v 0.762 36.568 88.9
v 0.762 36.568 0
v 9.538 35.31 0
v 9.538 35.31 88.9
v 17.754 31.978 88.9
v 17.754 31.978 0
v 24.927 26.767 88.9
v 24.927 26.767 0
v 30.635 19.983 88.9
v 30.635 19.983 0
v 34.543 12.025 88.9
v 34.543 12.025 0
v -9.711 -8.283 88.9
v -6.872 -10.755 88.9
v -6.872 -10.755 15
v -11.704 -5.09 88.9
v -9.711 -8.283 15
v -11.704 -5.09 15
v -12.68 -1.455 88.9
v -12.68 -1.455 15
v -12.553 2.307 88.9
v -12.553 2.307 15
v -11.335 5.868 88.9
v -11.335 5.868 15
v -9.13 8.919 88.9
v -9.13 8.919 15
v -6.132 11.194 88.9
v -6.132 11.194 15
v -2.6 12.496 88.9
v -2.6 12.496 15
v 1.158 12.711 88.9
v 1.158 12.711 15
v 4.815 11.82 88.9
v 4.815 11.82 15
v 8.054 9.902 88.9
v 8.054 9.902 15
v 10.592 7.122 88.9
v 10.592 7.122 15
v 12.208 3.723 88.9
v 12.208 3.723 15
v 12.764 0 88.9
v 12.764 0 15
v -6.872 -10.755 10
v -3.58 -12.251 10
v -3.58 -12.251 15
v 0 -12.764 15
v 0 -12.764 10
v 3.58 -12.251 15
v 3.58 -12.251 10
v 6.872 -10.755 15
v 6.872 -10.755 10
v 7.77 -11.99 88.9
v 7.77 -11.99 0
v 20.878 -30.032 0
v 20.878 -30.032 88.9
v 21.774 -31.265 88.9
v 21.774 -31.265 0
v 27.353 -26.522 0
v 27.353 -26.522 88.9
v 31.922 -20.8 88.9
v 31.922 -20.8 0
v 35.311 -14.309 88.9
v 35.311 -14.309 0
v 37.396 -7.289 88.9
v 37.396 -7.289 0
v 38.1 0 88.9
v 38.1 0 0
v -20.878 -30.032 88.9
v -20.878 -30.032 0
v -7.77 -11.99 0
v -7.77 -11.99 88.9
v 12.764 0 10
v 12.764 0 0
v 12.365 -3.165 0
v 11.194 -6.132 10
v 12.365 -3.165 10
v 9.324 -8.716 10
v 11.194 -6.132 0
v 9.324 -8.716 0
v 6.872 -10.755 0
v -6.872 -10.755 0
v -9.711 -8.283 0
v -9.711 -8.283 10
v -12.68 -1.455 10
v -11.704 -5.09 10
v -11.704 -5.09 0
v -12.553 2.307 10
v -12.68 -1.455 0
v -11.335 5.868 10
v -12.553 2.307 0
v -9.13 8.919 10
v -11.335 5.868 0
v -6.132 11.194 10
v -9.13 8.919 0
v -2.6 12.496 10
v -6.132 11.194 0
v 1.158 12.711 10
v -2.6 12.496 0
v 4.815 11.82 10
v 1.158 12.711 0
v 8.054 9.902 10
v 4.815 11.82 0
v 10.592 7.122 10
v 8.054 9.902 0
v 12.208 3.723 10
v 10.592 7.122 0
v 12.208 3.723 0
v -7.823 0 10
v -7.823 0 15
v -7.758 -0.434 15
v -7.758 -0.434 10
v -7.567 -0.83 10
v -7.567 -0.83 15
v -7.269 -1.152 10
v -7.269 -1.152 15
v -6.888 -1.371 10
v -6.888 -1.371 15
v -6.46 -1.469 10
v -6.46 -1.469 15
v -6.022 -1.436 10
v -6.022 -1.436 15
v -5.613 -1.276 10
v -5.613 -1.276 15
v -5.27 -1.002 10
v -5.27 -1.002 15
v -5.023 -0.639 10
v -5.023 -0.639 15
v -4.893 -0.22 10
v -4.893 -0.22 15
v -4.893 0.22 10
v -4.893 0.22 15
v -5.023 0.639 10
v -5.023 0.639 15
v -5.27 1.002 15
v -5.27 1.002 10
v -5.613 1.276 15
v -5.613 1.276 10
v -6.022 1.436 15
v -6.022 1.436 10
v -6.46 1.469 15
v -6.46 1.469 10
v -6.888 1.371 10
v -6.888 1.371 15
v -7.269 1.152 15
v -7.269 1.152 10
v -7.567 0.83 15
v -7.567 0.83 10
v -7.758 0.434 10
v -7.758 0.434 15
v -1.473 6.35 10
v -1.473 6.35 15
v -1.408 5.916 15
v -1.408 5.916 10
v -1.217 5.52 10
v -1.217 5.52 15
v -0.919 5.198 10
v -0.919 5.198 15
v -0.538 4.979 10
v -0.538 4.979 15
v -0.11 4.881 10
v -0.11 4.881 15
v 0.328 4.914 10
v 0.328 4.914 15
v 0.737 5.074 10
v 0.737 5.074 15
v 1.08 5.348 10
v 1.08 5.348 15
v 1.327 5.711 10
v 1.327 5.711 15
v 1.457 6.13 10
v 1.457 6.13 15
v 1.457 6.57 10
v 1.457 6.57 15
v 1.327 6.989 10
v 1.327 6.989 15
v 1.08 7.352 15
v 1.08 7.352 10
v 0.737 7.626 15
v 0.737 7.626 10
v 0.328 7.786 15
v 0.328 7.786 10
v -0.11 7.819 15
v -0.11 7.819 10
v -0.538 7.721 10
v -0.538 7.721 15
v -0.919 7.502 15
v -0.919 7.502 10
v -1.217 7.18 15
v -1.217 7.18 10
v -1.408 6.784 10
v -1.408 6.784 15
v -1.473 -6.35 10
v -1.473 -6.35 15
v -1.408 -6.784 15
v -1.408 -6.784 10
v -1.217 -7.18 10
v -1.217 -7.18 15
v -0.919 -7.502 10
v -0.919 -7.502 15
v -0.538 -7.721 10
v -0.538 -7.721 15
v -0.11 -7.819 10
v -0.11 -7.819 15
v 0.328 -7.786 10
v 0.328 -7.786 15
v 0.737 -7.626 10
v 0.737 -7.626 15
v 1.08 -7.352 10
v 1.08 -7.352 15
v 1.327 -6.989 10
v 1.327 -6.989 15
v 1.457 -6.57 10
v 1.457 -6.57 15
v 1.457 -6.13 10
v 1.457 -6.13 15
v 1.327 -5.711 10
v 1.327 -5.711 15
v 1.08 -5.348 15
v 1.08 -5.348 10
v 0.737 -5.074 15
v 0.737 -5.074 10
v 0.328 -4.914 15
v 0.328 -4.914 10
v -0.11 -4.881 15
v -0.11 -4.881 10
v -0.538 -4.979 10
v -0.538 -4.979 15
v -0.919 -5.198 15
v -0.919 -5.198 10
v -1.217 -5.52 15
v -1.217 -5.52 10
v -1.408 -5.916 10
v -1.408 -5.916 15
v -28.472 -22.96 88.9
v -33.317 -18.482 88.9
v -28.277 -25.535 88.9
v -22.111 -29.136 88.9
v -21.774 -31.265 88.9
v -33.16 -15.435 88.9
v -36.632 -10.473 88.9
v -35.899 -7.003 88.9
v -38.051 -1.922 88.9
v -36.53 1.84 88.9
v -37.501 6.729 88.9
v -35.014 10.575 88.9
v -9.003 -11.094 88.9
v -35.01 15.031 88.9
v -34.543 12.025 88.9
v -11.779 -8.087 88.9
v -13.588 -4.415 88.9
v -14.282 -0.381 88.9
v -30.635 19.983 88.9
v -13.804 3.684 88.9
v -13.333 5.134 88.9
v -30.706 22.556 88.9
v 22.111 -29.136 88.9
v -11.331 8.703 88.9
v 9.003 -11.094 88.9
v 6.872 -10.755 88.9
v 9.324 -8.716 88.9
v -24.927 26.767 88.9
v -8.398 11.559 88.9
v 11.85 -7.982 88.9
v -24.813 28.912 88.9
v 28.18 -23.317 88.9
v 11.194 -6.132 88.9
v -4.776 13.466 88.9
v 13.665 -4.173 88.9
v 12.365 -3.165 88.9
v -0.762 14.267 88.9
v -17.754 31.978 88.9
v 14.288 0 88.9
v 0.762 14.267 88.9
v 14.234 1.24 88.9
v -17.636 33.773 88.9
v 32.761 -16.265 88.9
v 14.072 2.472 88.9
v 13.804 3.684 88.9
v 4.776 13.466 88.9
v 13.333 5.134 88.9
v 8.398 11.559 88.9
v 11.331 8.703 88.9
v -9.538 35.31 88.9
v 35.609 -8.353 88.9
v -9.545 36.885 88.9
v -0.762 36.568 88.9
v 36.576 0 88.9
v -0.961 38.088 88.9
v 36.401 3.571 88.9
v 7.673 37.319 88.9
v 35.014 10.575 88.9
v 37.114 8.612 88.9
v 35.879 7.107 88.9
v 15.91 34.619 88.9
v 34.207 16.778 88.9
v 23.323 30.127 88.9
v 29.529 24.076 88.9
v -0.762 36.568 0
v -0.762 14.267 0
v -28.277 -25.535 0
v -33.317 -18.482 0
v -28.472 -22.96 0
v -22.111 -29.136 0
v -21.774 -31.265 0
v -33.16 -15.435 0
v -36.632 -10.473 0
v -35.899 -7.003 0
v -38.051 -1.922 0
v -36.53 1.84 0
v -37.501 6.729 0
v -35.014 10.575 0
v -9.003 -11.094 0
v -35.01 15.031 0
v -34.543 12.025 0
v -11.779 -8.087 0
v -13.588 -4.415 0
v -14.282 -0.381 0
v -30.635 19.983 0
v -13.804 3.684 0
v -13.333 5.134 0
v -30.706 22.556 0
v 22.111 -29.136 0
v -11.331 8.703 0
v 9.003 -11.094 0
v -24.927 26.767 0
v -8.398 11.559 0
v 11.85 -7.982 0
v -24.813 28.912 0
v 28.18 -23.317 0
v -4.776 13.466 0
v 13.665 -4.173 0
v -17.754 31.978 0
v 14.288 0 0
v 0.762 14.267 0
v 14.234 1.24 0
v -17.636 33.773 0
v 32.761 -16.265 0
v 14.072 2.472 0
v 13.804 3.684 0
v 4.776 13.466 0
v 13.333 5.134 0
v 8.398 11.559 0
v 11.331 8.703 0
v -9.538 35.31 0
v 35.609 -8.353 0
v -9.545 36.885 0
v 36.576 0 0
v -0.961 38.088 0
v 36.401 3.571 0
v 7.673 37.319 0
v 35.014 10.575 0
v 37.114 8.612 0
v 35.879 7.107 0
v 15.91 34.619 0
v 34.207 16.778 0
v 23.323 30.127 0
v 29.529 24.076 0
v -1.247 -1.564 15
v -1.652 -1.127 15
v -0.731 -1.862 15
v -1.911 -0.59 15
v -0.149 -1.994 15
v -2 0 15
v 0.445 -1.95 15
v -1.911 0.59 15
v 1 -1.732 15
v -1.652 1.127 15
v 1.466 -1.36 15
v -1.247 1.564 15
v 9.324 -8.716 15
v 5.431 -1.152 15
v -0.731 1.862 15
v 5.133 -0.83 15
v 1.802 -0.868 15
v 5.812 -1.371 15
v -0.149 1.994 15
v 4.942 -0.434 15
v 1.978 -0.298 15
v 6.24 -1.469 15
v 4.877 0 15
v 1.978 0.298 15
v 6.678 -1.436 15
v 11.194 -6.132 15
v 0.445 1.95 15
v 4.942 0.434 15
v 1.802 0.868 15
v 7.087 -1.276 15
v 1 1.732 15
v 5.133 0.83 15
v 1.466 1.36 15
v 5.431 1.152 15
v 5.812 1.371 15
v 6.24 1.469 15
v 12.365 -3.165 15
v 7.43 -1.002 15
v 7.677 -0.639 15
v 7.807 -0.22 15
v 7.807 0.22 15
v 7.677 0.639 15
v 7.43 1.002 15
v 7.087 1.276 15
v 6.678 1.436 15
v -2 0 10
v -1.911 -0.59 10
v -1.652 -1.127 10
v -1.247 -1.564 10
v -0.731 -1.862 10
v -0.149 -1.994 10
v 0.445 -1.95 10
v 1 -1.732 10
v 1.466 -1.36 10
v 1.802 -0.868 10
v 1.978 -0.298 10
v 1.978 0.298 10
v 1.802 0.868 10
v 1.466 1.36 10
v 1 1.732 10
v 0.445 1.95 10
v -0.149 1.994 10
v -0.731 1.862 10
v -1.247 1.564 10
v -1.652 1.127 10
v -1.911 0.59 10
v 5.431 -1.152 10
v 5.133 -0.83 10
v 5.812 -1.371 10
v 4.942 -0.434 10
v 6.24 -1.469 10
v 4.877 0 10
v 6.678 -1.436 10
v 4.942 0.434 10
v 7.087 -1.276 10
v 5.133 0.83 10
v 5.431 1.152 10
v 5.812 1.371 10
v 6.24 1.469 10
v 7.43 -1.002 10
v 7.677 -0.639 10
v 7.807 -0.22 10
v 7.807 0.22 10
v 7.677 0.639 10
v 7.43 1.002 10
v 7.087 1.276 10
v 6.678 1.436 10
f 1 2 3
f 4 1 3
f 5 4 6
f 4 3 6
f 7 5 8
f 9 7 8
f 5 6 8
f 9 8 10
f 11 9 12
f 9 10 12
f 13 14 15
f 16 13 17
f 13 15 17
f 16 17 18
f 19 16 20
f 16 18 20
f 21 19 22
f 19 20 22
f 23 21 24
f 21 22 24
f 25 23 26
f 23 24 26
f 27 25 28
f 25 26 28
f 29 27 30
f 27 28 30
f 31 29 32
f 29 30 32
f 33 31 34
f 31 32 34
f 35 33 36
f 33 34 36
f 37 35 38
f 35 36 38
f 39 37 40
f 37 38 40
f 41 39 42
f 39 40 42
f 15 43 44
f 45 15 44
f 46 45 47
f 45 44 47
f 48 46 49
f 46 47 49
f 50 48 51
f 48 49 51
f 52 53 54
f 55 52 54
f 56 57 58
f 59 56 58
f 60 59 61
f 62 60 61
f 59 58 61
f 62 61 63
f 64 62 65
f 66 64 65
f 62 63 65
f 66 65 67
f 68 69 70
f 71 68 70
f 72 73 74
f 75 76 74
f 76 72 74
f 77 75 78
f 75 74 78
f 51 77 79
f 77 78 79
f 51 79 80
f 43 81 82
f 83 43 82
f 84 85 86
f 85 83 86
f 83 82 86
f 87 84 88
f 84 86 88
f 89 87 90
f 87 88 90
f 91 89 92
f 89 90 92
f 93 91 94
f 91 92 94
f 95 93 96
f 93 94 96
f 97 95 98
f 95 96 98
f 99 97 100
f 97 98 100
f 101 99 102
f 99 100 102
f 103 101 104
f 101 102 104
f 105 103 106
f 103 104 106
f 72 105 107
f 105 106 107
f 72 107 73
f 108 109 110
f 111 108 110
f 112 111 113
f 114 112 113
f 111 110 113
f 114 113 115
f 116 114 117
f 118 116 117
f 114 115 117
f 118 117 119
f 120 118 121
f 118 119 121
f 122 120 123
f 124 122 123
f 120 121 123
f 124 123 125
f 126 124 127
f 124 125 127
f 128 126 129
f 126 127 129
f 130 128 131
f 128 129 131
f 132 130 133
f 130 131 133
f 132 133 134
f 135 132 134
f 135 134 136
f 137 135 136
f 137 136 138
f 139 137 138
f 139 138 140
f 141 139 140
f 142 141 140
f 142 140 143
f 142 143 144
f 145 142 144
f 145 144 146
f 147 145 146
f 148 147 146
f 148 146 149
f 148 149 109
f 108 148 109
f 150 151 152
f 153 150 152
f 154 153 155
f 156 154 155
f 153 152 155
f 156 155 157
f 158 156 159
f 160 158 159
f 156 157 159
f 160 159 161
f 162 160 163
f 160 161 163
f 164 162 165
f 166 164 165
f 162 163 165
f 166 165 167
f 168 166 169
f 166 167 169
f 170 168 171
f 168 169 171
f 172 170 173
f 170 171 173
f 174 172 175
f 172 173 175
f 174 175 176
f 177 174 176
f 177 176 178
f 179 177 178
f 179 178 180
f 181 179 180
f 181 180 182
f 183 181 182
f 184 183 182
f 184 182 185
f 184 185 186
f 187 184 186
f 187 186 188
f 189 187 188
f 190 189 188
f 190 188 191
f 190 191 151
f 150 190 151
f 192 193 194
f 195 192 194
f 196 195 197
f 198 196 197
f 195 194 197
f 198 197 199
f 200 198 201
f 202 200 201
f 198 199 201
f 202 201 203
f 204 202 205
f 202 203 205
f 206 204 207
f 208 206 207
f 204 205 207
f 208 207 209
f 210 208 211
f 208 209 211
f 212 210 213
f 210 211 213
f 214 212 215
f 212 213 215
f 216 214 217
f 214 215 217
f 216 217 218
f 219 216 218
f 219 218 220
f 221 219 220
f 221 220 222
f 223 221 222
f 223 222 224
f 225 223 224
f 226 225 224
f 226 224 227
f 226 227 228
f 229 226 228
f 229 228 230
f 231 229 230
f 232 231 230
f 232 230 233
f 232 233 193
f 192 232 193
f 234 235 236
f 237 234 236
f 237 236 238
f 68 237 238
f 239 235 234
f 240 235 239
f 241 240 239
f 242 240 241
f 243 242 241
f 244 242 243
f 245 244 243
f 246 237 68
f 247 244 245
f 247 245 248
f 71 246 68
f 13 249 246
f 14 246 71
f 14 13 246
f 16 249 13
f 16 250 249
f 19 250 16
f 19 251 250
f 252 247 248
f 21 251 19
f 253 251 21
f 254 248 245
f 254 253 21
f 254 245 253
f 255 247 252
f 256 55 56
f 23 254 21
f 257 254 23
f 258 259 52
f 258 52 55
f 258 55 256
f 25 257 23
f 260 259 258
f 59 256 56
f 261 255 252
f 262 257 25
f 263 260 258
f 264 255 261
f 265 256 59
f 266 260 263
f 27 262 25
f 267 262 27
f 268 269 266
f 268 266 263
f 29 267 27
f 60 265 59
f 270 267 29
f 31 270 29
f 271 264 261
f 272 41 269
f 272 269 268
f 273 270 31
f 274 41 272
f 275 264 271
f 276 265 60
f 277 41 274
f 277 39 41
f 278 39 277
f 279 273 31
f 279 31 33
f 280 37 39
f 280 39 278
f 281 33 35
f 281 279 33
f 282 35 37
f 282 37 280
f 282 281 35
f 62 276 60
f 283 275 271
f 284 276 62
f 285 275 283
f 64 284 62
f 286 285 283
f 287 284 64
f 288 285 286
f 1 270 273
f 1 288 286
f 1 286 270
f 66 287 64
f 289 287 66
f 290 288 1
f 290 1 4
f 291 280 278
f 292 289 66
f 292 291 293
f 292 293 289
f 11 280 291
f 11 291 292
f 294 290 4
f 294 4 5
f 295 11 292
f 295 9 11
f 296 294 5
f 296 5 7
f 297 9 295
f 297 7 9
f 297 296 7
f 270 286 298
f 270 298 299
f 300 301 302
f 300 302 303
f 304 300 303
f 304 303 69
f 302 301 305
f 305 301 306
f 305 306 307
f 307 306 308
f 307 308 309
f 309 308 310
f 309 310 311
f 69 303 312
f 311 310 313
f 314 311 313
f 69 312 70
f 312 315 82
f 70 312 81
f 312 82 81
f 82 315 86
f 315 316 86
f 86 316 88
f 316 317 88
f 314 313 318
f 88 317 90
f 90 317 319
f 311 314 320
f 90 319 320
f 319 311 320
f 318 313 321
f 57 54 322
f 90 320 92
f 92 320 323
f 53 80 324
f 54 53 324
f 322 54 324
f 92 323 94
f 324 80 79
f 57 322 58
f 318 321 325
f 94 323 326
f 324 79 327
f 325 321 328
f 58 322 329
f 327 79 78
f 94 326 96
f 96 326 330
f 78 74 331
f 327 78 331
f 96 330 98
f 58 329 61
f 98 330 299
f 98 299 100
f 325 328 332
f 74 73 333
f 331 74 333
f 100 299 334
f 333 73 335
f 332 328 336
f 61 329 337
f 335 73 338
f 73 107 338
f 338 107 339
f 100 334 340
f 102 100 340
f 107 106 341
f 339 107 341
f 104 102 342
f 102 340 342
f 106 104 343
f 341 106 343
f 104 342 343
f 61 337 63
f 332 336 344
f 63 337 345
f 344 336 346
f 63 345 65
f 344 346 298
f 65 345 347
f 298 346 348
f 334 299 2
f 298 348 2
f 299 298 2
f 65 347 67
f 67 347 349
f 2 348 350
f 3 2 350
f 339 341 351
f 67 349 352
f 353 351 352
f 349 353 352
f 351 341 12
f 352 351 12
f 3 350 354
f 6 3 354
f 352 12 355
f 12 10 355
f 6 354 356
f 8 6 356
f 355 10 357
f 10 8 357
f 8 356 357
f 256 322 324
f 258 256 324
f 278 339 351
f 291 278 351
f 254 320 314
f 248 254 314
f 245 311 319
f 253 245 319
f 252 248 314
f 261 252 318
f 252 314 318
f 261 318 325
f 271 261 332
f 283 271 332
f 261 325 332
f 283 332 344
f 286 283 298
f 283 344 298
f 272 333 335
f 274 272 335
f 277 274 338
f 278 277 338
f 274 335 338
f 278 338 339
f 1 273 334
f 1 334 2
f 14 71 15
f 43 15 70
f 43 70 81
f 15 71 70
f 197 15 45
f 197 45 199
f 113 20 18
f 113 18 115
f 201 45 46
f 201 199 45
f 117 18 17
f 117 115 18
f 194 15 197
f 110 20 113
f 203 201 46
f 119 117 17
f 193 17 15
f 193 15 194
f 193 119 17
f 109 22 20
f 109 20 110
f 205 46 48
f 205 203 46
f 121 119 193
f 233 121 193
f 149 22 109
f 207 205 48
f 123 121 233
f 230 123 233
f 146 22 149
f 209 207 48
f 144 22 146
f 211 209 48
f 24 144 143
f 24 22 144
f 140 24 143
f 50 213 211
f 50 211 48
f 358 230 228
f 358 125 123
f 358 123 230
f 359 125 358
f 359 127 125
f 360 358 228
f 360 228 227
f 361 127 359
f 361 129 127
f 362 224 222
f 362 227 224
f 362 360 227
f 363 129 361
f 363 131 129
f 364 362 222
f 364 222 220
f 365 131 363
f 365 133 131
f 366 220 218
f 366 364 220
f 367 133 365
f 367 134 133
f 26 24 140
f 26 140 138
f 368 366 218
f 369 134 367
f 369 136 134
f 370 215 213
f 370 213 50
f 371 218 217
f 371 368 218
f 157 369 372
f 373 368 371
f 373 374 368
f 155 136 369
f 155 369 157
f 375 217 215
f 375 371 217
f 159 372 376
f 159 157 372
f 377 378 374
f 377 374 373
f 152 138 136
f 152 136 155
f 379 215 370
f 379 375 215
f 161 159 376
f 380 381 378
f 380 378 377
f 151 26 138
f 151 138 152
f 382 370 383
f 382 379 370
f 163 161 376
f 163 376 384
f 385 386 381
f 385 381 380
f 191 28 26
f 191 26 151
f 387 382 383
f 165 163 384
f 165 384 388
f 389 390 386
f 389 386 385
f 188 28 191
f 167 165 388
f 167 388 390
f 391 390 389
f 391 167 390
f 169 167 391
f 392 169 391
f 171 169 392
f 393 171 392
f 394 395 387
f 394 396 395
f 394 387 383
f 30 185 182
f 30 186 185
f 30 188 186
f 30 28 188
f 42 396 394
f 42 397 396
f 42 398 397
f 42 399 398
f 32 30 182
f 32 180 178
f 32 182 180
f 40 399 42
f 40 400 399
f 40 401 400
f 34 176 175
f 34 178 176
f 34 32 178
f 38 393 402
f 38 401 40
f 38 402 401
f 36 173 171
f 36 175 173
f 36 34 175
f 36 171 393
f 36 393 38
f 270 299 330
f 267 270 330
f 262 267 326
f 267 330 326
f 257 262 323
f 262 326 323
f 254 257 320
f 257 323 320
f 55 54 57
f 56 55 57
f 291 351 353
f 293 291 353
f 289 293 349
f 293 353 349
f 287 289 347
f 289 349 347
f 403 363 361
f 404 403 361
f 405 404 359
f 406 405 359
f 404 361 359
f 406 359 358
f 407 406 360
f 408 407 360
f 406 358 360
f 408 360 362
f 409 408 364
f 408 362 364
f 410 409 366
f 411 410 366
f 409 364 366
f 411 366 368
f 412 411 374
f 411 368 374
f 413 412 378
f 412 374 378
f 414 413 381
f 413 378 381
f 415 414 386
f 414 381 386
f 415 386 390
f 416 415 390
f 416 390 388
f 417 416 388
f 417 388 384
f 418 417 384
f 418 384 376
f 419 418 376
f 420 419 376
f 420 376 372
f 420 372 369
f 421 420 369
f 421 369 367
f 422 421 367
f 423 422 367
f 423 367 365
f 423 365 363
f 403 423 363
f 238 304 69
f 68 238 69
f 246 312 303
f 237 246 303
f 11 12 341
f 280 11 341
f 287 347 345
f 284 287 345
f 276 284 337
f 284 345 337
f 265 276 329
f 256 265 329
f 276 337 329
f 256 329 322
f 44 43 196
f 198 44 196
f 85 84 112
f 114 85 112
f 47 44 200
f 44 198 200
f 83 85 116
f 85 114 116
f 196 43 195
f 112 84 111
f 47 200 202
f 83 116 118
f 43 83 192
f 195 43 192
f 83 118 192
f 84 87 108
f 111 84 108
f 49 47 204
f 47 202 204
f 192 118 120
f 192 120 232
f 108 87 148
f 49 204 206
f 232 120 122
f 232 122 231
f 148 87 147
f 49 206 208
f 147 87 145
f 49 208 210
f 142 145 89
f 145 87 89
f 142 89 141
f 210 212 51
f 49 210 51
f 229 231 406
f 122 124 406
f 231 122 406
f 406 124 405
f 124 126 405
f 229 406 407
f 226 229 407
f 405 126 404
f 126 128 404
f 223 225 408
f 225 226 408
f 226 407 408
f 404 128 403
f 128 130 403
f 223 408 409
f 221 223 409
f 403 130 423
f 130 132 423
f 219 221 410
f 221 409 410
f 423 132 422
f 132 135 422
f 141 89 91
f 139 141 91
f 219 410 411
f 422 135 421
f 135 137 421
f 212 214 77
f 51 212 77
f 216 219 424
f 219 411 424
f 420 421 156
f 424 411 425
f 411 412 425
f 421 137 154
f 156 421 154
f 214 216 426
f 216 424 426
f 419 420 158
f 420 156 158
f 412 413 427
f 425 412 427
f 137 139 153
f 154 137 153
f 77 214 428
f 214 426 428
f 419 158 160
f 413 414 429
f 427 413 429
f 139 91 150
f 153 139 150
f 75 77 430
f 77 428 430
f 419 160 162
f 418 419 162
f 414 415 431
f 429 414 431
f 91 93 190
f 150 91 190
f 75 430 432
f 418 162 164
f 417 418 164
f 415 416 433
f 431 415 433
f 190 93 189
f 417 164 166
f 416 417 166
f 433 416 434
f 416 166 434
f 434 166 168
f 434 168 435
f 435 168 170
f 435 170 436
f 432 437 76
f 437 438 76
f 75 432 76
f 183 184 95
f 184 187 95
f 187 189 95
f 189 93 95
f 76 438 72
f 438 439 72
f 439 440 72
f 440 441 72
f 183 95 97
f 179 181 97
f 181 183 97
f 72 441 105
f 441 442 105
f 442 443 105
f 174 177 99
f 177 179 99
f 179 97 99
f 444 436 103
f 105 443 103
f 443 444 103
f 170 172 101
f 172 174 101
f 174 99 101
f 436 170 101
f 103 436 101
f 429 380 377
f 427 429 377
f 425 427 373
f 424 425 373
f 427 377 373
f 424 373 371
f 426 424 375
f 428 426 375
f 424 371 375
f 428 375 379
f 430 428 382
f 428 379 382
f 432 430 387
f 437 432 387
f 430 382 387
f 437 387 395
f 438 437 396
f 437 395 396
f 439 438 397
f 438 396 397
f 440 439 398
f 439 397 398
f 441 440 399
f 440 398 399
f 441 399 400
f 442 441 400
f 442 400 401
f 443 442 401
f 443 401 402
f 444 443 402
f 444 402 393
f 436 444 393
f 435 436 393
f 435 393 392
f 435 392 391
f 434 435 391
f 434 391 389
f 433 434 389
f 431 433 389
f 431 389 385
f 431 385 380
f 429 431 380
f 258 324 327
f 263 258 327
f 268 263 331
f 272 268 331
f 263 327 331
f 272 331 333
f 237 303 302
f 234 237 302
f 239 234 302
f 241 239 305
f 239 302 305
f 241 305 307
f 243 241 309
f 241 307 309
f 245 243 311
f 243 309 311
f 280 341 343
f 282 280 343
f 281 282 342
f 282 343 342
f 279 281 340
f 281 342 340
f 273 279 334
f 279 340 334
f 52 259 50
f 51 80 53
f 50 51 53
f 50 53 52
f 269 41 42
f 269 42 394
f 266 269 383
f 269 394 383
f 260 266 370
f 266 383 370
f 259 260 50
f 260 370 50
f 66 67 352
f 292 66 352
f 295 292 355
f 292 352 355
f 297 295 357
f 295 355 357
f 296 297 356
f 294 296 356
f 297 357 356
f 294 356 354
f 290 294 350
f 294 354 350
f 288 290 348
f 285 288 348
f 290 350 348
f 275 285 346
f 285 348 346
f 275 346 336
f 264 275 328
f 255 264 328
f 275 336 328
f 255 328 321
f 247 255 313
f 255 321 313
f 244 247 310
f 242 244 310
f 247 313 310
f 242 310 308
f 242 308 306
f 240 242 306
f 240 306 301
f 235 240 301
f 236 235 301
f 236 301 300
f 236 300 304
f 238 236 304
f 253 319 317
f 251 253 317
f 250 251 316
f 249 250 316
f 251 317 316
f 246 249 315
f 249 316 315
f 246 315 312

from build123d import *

# Parameters (mm, degrees)
F1_DEPTH = 88.9
F3_R     = 12.7635
F4_DEPTH = 5
F5_D     = 2.9464
F6_D     = 4


with BuildPart() as f1:
    # F0 (on Top) → F1 (new body)
    with BuildSketch(Plane.XY):
        with BuildLine():
            ThreePointArc((-8.3979817921, -11.5588303071), (-8.0866479786, -11.7787427479), (-7.7695585406, -11.9902717373))
            Line((-7.7695585406, -11.9902717373), (-6.8723442619, -10.7553622252))
            ThreePointArc((-6.8723442619, -10.7553622252), (-6.1315481839, 11.194241784), (12.7635, 0))
            ThreePointArc((12.7635, 0), (11.194241784, -6.1315481839), (6.8723442619, -10.7553622252))
            Line((6.8723442619, -10.7553622252), (7.7695585406, -11.9902717373))
            ThreePointArc((7.7695585406, -11.9902717373), (8.0866479786, -11.7787427479), (8.3979817921, -11.5588303071))
            ThreePointArc((8.3979817921, -11.5588303071), (8.7033383912, -11.3306909365), (9.00250044, -11.0944870128))
            ThreePointArc((9.00250044, -11.0944870128), (12.8987573294, -6.1444866023), (14.2875, 0))
            ThreePointArc((14.2875, 0), (14.1661979921, 1.8578188013), (13.8043516957, 3.6840915448))
            ThreePointArc((13.8043516957, 3.6840915448), (13.701161697, 4.0510275736), (13.5882199766, 4.4150803071))
            ThreePointArc((13.5882199766, 4.4150803071), (13.46560692, 4.7759906331), (13.3334097963, 5.1335016756))
            ThreePointArc((13.3334097963, 5.1335016756), (8.3979817921, 11.5588303071), (0.762, 14.2671655296))
            ThreePointArc((0.762, 14.2671655296), (0.3811356355, 14.2824154777), (0, 14.2875))
            ThreePointArc((0, 14.2875), (-0.3811356355, 14.2824154777), (-0.762, 14.2671655296))
            ThreePointArc((-0.762, 14.2671655296), (-8.3979817921, 11.5588303071), (-13.3334097963, 5.1335016756))
            ThreePointArc((-13.3334097963, 5.1335016756), (-13.4656069199, 4.7759906331), (-13.5882199766, 4.4150803071))
            ThreePointArc((-13.5882199766, 4.4150803071), (-13.701161697, 4.0510275736), (-13.8043516957, 3.6840915448))
            ThreePointArc((-13.8043516957, 3.6840915448), (-13.5882199766, -4.4150803071), (-9.00250044, -11.0944870128))
            ThreePointArc((-9.00250044, -11.0944870128), (-8.7033383912, -11.3306909365), (-8.3979817921, -11.5588303071))
        make_face()
        with BuildLine():
            ThreePointArc((0, 36.576), (-0.3810206745, 36.5740153558), (-0.762, 36.5680616385))
            Line((-0.762, 36.5680616385), (-0.762, 14.2671655296))
            ThreePointArc((-0.762, 14.2671655296), (-0.3811356355, 14.2824154777), (0, 14.2875))
            Line((0, 14.2875), (0, 36.576))
        make_face()
        with BuildLine():
            ThreePointArc((0.762, 36.5680616385), (0.3810206745, 36.5740153558), (0, 36.576))
            Line((0, 36.576), (0, 14.2875))
            ThreePointArc((0, 14.2875), (0.3811356355, 14.2824154777), (0.762, 14.2671655296))
            Line((0.762, 14.2671655296), (0.762, 36.5680616385))
        make_face()
        with BuildLine():
            Line((13.5882199766, 4.4150803071), (34.78584314, 11.3026055863))
            ThreePointArc((34.78584314, 11.3026055863), (34.6662137676, 11.6643644928), (34.5428223599, 12.0248575631))
            Line((34.5428223599, 12.0248575631), (13.3334097963, 5.1335016756))
            ThreePointArc((13.3334097963, 5.1335016756), (13.46560692, 4.7759906331), (13.5882199766, 4.4150803071))
        make_face()
        with BuildLine():
            Line((13.8043516957, 3.6840915448), (35.0137642593, 10.5754474322))
            ThreePointArc((35.0137642593, 10.5754474322), (34.9016974948, 10.9396201021), (34.78584314, 11.3026055863))
            Line((34.78584314, 11.3026055863), (13.5882199766, 4.4150803071))
            ThreePointArc((13.5882199766, 4.4150803071), (13.701161697, 4.0510275736), (13.8043516957, 3.6840915448))
        make_face()
        with BuildLine():
            ThreePointArc((-34.5428223599, 12.0248575631), (-34.6662137676, 11.6643644928), (-34.78584314, 11.3026055863))
            Line((-34.78584314, 11.3026055863), (-13.5882199766, 4.4150803071))
            ThreePointArc((-13.5882199766, 4.4150803071), (-13.4656069199, 4.7759906331), (-13.3334097963, 5.1335016756))
            Line((-13.3334097963, 5.1335016756), (-34.5428223599, 12.0248575631))
        make_face()
        with BuildLine():
            ThreePointArc((-34.78584314, 11.3026055863), (-34.9016974948, 10.9396201021), (-35.0137642593, 10.5754474322))
            Line((-35.0137642593, 10.5754474322), (-13.8043516957, 3.6840915448))
            ThreePointArc((-13.8043516957, 3.6840915448), (-13.701161697, 4.0510275736), (-13.5882199766, 4.4150803071))
            Line((-13.5882199766, 4.4150803071), (-34.78584314, 11.3026055863))
        make_face()
        with BuildLine():
            ThreePointArc((21.773667791, -31.2652745218), (33.7726719615, -17.6356635424), (38.1, 0))
            ThreePointArc((38.1, 0), (-17.6356635424, 33.7726719615), (-21.773667791, -31.2652745218))
            Line((-21.773667791, -31.2652745218), (-20.8776963863, -30.0320756792))
            ThreePointArc((-20.8776963863, -30.0320756792), (-21.1894146424, -29.8129583087), (-21.4988333878, -29.5906055863))
            ThreePointArc((-21.4988333878, -29.5906055863), (-21.8059190441, -29.3650416421), (-22.1106382858, -29.1362909547))
            ThreePointArc((-22.1106382858, -29.1362909547), (-34.78584314, -11.3026055863), (-35.0137642593, 10.5754474322))
            ThreePointArc((-35.0137642593, 10.5754474322), (-34.9016974948, 10.9396201021), (-34.78584314, 11.3026055863))
            ThreePointArc((-34.78584314, 11.3026055863), (-34.6662137676, 11.6643644928), (-34.5428223599, 12.0248575631))
            ThreePointArc((-34.5428223599, 12.0248575631), (-21.4988333878, 29.5906055863), (-0.762, 36.5680616385))
            ThreePointArc((-0.762, 36.5680616385), (-0.3810206745, 36.5740153558), (0, 36.576))
            ThreePointArc((0, 36.576), (0.3810206745, 36.5740153558), (0.762, 36.5680616385))
            ThreePointArc((0.762, 36.5680616385), (21.4988333878, 29.5906055863), (34.5428223599, 12.0248575631))
            ThreePointArc((34.5428223599, 12.0248575631), (34.6662137676, 11.6643644928), (34.78584314, 11.3026055863))
            ThreePointArc((34.78584314, 11.3026055863), (34.9016974948, 10.9396201021), (35.0137642593, 10.5754474322))
            ThreePointArc((35.0137642593, 10.5754474322), (36.183333301, 5.3451068488), (36.576, 0))
            ThreePointArc((36.576, 0), (32.7606660642, -16.264763602), (22.1106382858, -29.1362909547))
            ThreePointArc((22.1106382858, -29.1362909547), (21.8059190441, -29.3650416421), (21.4988333878, -29.5906055863))
            ThreePointArc((21.4988333878, -29.5906055863), (21.1894146424, -29.8129583087), (20.8776963863, -30.0320756792))
            Line((20.8776963863, -30.0320756792), (21.773667791, -31.2652745218))
        make_face()
        with BuildLine():
            Line((7.7695585406, -11.9902717373), (20.8776963863, -30.0320756792))
            ThreePointArc((20.8776963863, -30.0320756792), (21.1894146424, -29.8129583087), (21.4988333878, -29.5906055863))
            Line((21.4988333878, -29.5906055863), (8.3979817921, -11.5588303071))
            ThreePointArc((8.3979817921, -11.5588303071), (8.0866479786, -11.7787427479), (7.7695585406, -11.9902717373))
        make_face()
        with BuildLine():
            Line((8.3979817921, -11.5588303071), (21.4988333878, -29.5906055863))
            ThreePointArc((21.4988333878, -29.5906055863), (21.8059190441, -29.3650416421), (22.1106382858, -29.1362909547))
            Line((22.1106382858, -29.1362909547), (9.00250044, -11.0944870128))
            ThreePointArc((9.00250044, -11.0944870128), (8.7033383912, -11.3306909365), (8.3979817921, -11.5588303071))
        make_face()
        with BuildLine():
            ThreePointArc((-21.4988333878, -29.5906055863), (-21.1894146424, -29.8129583087), (-20.8776963863, -30.0320756792))
            Line((-20.8776963863, -30.0320756792), (-7.7695585406, -11.9902717373))
            ThreePointArc((-7.7695585406, -11.9902717373), (-8.0866479786, -11.7787427479), (-8.3979817921, -11.5588303071))
            Line((-8.3979817921, -11.5588303071), (-21.4988333878, -29.5906055863))
        make_face()
        with BuildLine():
            ThreePointArc((-22.1106382858, -29.1362909547), (-21.8059190441, -29.3650416421), (-21.4988333878, -29.5906055863))
            Line((-21.4988333878, -29.5906055863), (-8.3979817921, -11.5588303071))
            ThreePointArc((-8.3979817921, -11.5588303071), (-8.7033383912, -11.3306909365), (-9.00250044, -11.0944870128))
            Line((-9.00250044, -11.0944870128), (-22.1106382858, -29.1362909547))
        make_face()
    extrude(amount=F1_DEPTH)

    # F3 (on offset) → F4 (join)
    with BuildSketch(Plane.XY.offset(10)):
        Circle(F3_R)
    extrude(amount=F4_DEPTH)

    # F5 (through all)
    with Locations(Plane(origin=(0, 0, 10), x_dir=(1, 0, 0), z_dir=(0, 0, -1))):
        with Locations((0, -6.35), (6.35, 0), (0, 6.35), (-6.35, 0)):
            Hole(F5_D / 2)

    # F6 (through all)
    with Locations(Plane(origin=(0, 0, 10), x_dir=(1, 0, 0), z_dir=(0, 0, -1))):
        with Locations((0, 0)):
            Hole(F6_D / 2)


solid = f1.part
